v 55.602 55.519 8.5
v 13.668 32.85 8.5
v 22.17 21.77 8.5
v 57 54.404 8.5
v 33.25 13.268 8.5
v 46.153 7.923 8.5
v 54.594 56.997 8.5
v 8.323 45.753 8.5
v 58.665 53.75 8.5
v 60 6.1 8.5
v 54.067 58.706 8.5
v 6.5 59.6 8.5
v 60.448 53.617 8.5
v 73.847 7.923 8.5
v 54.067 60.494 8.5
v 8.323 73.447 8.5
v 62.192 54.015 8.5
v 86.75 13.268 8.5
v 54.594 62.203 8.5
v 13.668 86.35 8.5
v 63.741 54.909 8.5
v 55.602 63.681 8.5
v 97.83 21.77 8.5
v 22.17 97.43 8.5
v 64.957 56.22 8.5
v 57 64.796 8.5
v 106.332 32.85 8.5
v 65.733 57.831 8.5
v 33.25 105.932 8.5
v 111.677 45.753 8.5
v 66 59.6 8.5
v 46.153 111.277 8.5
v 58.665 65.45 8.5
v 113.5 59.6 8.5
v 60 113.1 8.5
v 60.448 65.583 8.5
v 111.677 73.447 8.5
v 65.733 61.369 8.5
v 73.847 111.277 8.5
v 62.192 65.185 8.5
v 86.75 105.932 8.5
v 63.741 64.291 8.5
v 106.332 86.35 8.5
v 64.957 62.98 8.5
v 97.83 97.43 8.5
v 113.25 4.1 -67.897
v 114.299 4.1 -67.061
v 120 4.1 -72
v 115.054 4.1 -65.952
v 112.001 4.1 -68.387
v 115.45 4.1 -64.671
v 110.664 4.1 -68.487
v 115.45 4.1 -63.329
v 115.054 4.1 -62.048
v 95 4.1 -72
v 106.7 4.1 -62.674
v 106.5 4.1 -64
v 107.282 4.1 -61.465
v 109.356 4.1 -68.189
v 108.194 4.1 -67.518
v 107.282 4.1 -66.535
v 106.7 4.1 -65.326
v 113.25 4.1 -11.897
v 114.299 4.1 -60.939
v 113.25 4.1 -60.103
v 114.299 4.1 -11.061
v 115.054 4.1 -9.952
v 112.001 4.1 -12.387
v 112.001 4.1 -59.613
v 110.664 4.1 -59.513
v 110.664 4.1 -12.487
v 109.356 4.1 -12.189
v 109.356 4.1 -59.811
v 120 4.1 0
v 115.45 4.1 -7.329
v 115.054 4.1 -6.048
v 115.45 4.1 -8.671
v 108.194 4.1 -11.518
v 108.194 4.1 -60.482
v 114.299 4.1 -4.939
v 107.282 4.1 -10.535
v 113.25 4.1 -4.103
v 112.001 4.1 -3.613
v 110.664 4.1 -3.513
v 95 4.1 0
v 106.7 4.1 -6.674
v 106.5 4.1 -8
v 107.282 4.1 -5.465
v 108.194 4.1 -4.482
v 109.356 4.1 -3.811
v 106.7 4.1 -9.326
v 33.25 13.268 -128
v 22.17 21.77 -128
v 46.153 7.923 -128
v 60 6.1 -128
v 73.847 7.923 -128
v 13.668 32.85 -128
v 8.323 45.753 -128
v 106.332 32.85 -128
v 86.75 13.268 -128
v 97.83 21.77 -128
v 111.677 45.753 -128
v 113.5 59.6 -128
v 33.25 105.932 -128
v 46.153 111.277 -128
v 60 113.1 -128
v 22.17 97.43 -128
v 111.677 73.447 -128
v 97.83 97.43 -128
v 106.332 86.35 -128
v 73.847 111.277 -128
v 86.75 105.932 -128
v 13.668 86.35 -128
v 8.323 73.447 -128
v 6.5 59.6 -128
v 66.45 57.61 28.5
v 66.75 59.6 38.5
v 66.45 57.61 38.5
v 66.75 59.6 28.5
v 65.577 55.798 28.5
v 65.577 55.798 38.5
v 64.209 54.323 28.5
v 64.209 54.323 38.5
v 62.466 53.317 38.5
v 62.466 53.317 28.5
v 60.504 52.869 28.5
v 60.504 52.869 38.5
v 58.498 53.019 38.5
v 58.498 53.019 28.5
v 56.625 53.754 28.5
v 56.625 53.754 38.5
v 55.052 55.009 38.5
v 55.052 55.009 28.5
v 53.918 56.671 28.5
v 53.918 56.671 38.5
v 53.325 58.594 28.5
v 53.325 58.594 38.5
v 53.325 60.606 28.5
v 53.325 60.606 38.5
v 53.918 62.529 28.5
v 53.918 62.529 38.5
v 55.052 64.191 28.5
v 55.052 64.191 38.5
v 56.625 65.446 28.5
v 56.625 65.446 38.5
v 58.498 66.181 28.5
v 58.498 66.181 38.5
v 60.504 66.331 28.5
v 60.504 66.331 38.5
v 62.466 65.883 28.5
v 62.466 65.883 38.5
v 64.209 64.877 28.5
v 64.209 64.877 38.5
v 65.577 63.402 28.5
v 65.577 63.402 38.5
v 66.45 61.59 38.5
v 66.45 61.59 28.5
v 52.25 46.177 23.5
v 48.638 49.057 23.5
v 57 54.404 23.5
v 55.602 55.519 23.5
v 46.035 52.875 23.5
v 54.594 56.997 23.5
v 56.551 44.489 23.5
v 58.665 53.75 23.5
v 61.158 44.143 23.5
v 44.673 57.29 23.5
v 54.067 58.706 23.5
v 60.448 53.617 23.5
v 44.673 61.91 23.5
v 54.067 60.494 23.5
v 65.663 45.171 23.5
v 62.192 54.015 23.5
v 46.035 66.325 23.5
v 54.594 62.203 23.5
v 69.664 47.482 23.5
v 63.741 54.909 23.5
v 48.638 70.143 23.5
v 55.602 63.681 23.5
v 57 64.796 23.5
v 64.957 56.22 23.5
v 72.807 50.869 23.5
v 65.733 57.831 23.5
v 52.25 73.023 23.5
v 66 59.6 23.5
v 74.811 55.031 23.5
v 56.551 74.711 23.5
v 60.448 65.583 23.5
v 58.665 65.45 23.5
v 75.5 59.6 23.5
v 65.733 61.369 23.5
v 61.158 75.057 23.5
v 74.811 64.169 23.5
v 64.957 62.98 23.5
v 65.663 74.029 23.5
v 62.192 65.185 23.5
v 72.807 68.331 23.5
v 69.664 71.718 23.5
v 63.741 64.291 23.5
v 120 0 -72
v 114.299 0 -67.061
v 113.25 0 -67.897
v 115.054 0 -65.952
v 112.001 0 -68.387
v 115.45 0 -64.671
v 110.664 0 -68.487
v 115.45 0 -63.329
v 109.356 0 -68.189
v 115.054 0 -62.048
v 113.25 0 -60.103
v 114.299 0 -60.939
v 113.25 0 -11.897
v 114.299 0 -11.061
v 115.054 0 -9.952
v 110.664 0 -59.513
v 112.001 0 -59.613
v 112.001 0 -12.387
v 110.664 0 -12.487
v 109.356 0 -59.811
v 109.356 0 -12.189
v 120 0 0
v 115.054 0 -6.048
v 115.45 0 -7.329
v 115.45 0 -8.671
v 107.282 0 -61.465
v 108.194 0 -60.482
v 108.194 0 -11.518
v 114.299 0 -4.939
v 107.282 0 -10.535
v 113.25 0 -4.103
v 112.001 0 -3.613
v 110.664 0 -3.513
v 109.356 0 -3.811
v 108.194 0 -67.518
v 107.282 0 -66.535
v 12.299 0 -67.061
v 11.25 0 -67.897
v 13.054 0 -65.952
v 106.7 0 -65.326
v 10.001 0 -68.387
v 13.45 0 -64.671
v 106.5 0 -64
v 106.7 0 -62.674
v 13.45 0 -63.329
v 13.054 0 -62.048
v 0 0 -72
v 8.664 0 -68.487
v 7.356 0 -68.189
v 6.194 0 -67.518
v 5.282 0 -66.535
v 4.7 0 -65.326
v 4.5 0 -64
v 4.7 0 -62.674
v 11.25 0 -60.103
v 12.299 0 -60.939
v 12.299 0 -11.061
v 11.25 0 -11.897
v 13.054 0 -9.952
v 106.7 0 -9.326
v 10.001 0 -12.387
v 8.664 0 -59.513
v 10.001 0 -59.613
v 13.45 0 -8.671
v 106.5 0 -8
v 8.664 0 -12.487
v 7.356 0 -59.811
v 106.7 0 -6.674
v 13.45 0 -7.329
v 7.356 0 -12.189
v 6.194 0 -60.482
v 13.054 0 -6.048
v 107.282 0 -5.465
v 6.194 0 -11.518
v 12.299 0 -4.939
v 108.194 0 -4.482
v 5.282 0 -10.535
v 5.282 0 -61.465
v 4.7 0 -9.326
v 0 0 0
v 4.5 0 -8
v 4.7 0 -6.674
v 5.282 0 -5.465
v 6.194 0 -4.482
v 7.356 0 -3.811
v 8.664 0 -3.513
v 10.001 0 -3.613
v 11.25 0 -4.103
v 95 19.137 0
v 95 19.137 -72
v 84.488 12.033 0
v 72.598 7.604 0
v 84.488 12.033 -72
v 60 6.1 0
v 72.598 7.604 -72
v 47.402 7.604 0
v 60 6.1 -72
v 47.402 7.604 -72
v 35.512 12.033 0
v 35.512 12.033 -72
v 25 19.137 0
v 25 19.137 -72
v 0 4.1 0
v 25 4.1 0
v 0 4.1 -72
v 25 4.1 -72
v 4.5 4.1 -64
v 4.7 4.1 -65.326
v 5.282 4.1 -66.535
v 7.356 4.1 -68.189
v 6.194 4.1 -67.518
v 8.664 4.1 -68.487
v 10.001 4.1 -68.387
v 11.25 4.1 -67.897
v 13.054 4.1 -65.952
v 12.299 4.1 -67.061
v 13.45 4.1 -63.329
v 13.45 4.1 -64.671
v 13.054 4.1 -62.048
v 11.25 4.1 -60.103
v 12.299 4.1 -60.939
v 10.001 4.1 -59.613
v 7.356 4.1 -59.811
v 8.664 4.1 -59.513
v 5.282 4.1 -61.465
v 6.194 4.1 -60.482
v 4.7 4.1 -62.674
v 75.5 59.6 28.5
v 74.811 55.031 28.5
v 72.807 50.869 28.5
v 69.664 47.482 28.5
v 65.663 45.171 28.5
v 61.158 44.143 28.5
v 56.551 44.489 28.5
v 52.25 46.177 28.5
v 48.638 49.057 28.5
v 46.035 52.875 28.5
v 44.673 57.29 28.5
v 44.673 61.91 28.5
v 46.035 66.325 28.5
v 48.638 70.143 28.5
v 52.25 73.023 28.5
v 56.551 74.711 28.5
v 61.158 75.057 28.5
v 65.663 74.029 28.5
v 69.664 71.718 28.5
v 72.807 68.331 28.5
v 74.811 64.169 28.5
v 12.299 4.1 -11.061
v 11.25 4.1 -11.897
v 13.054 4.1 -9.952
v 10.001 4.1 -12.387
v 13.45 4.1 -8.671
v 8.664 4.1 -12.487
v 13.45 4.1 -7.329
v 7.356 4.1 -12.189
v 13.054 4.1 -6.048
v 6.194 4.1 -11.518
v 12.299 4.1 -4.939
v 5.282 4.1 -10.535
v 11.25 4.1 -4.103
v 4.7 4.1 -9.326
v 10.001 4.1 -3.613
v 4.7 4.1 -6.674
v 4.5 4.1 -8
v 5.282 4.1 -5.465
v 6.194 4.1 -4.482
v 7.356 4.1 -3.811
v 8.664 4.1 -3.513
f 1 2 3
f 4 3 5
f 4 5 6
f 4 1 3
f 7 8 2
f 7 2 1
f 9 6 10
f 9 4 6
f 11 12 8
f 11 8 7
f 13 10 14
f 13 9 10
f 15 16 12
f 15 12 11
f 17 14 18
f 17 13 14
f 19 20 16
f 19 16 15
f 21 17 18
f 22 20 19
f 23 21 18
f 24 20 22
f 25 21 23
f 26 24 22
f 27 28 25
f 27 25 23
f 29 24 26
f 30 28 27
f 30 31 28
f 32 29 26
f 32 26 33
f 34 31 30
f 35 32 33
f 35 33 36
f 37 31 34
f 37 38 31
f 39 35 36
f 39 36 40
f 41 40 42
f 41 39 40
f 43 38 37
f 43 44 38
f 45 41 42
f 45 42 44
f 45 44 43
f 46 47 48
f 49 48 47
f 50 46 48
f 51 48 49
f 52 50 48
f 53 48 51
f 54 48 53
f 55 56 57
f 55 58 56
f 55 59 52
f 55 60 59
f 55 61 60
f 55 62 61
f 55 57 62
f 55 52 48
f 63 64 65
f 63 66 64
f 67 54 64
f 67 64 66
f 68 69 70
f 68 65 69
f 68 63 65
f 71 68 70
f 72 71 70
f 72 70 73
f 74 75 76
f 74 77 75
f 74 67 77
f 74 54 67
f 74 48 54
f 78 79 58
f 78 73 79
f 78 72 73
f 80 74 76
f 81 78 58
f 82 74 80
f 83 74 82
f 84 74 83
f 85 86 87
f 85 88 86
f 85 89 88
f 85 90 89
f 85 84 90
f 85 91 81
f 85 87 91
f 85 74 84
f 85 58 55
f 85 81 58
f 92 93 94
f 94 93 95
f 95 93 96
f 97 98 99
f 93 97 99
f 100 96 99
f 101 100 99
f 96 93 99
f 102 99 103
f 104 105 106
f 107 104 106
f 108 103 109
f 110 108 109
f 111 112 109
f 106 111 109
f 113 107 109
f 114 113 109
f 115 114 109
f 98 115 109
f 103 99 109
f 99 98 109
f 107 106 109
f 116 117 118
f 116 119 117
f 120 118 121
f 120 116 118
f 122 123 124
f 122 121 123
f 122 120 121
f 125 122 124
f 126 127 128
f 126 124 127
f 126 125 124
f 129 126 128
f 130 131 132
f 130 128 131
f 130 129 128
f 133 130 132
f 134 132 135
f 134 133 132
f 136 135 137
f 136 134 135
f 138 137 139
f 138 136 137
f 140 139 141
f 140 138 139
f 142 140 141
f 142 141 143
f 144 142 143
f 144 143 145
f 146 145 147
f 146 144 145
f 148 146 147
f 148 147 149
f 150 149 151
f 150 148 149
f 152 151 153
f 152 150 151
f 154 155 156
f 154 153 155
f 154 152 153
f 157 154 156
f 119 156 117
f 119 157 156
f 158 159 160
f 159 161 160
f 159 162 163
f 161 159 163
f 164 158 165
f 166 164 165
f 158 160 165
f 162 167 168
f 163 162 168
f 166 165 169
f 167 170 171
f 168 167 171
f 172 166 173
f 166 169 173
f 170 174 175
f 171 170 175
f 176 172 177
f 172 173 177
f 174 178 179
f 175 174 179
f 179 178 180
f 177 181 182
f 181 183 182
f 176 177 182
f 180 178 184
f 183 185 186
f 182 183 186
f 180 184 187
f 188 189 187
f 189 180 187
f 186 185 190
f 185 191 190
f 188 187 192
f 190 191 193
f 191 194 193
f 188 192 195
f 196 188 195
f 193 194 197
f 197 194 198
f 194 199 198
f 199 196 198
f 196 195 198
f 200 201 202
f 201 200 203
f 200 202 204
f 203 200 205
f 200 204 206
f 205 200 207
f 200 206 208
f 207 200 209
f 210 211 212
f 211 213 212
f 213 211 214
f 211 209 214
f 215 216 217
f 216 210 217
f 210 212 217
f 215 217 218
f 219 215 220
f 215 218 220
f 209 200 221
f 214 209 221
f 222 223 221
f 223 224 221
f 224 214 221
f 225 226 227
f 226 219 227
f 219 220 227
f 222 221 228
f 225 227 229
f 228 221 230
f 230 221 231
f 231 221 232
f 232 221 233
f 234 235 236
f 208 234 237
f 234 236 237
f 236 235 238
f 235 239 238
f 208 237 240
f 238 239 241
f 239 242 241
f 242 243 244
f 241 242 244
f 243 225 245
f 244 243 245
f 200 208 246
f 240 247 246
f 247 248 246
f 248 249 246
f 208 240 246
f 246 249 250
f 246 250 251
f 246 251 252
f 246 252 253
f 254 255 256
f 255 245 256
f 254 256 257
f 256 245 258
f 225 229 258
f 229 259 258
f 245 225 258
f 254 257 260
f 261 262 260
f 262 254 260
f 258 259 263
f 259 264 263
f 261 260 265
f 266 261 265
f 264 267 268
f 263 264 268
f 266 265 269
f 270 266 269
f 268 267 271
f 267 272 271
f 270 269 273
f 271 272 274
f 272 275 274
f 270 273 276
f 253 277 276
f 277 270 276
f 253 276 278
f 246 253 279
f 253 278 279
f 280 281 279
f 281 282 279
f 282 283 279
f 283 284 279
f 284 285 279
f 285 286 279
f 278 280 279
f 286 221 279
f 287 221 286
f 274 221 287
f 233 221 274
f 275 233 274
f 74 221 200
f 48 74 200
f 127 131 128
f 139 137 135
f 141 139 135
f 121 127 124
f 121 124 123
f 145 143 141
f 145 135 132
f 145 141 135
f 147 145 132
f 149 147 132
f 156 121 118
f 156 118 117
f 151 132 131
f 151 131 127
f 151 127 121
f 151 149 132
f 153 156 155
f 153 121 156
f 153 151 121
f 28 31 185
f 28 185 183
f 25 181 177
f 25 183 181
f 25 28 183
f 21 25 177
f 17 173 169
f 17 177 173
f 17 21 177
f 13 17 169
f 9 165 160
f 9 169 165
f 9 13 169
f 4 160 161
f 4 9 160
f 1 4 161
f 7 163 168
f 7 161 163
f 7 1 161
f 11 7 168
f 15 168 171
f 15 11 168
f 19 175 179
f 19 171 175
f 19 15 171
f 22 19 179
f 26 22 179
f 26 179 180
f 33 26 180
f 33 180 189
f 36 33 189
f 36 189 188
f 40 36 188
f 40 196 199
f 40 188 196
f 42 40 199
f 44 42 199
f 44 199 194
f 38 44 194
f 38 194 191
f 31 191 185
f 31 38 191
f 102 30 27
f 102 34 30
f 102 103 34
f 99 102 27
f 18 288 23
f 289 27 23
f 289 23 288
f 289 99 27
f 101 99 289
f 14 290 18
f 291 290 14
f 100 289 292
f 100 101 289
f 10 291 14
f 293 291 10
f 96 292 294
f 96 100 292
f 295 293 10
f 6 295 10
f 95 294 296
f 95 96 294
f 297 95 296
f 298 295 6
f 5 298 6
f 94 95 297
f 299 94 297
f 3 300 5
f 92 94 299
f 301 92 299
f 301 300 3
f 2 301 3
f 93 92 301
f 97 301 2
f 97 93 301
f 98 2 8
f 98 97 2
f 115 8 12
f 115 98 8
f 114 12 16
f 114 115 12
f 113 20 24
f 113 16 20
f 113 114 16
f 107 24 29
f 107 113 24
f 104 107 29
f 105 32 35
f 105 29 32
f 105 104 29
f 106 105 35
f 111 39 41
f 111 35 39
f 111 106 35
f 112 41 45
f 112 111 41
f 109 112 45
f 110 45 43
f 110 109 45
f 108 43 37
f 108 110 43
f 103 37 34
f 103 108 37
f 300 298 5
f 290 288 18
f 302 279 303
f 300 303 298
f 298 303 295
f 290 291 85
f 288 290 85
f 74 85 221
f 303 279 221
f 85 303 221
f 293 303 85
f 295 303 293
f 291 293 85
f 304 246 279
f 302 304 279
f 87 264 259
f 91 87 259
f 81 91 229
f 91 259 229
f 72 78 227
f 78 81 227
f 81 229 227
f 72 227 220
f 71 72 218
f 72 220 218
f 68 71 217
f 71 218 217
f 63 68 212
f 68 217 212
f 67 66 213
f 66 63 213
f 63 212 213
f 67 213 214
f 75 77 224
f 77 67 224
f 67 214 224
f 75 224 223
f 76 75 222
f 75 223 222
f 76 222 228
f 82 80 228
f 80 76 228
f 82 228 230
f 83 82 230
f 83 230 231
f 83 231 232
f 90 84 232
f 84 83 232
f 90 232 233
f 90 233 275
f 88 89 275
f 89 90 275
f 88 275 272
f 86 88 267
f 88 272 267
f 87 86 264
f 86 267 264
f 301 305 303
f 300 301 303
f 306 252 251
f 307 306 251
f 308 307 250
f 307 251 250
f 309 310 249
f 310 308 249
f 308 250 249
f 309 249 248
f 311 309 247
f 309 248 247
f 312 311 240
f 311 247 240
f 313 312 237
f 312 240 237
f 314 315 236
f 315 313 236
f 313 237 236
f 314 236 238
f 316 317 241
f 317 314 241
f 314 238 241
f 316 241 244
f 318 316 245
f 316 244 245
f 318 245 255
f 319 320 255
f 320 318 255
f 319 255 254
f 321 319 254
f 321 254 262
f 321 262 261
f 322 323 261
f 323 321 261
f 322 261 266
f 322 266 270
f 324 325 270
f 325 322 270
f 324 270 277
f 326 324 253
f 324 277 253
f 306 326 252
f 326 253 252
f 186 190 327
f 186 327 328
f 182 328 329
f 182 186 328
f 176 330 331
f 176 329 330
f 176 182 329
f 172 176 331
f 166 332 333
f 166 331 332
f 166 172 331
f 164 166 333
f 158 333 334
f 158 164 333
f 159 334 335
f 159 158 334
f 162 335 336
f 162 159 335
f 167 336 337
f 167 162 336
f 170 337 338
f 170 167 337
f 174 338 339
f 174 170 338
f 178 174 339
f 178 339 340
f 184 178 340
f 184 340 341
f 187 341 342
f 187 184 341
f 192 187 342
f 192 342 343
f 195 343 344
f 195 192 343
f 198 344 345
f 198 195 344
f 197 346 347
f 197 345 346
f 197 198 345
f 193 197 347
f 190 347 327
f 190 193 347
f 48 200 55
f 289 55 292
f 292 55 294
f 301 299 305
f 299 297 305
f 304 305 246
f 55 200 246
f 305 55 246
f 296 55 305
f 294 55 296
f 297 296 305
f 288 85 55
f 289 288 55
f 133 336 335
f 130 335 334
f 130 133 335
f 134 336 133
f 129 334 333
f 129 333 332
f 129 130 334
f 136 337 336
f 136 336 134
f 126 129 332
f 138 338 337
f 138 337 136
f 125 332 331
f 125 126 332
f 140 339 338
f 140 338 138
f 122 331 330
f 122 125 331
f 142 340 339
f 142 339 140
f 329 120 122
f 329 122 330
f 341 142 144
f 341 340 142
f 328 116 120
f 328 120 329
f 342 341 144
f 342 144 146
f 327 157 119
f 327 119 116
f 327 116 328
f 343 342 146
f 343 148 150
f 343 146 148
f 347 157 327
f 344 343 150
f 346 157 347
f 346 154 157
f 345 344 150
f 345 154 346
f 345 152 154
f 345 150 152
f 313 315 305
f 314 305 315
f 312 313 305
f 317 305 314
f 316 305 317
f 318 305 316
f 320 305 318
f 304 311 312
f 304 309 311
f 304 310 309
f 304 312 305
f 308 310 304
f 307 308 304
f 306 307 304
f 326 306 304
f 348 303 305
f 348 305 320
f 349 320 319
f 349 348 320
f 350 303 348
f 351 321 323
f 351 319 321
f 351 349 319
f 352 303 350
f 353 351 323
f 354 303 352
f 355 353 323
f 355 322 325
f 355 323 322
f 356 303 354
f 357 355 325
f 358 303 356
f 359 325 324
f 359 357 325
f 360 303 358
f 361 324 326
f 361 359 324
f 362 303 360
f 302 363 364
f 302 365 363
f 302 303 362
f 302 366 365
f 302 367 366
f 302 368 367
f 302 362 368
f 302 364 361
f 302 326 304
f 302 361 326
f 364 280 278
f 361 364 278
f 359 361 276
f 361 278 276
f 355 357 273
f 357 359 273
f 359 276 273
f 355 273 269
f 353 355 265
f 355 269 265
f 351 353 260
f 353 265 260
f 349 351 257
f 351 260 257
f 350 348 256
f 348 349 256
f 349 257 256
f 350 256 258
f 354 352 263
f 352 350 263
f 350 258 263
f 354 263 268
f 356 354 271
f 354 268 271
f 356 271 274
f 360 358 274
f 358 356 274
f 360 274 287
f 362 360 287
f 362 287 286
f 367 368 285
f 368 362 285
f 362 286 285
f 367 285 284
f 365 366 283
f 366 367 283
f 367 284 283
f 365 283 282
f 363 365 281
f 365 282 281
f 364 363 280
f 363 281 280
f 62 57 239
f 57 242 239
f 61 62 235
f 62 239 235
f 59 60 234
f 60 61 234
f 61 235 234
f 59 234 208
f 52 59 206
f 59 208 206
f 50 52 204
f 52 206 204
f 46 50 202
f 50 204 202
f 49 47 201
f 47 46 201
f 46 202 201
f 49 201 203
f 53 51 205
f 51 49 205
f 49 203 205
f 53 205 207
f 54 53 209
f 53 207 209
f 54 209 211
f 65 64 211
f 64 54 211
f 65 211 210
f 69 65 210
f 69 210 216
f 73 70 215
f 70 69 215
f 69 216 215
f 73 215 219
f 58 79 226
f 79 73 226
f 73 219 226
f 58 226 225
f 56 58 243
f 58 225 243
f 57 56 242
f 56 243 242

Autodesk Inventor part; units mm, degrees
ref_plane "YZ Plane" through (0, 0, 0) normal (1, 0, 0) x (0, 1, 0)
ref_plane "XZ Plane" through (0, 0, 0) normal (0, 1, 0) x (-1, 0, 0)
ref_plane "XY Plane" through (0, 0, 0) normal (0, 0, 1) x (1, 0, 0)
sketch "Sketch1" plane through (0, 0, 0) normal (0, 1, 0) x (-1, 0, 0)
  line L0 (0, 0) -> (-120, 0)
  line L1 (-120, 0) -> (-120, -72)
  line L2 (-120, -72) -> (0, -72)
  line L3 (0, -72) -> (0, 0)
  circle A0 centre (-9, -8) radius 4.5
  circle A1 centre (-111, -8) radius 4.5
  circle A2 centre (-9, -64) radius 4.5
  circle A3 centre (-111, -64) radius 4.5
  dimension "d0" = 120
  dimension "d1" = 72
  dimension "d2" = 9
  dimension "d3" = 9
  dimension "d4" = 9
  dimension "d5" = 9
extrude "Extrusion1" add sketch "Sketch1" along normal blind 4.1
sketch "Sketch2" plane through (0, 4.1, 0) normal (0, 1, 0) x (1, 0, 0)
  line L0 (0, 0) -> (120, 0) projected
  line L1 (120, 72) -> (0, 72) projected
  line L2 (25, 0) -> (95, 0)
  line L3 (95, 0) -> (95, 72)
  line L4 (95, 72) -> (25, 72)
  line L5 (25, 72) -> (25, 0)
  dimension "d8" = 70
extrude "Extrusion2" add sketch "Sketch2" along normal blind 53.5
sketch "Sketch3" plane through (0, 0, 0) normal (0, 0, 1) x (1, 0, 0)
  circle A0 centre (60, 59.6) radius 53.5
  point P0 (0, 0)
  dimension "d11" = 107
extrude "Extrusion3" add sketch "Sketch3" along normal blind 8.5 and the other way blind 128
sketch "Sketch4" plane through (60, 59.6, 8.5) normal (0, 0, 1) x (1, 0, 0)
  circle A0 centre (0, 0) radius 6
  point P0 (-60, -59.6)
  dimension "d16" = 12
extrude "Extrusion4" add sketch "Sketch4" along normal blind 15
sketch "Sketch5" plane through (60, 59.6, 23.5) normal (0, 0, 1) x (1, 0, 0)
  circle A0 centre (0, 0) radius 15.5
  point P0 (-60, -59.6)
  dimension "d19" = 31
extrude "Extrusion5" add sketch "Sketch5" along normal blind 5
sketch "Sketch6" plane through (60, 59.6, 28.5) normal (0, 0, 1) x (1, 0, 0)
  circle A0 centre (0, 0) radius 6.75
  point P0 (-60, -59.6)
  dimension "d22" = 13.5
extrude "Extrusion6" add sketch "Sketch6" along normal blind 10
properties part number "BLDC BM1109 MOTOR"
